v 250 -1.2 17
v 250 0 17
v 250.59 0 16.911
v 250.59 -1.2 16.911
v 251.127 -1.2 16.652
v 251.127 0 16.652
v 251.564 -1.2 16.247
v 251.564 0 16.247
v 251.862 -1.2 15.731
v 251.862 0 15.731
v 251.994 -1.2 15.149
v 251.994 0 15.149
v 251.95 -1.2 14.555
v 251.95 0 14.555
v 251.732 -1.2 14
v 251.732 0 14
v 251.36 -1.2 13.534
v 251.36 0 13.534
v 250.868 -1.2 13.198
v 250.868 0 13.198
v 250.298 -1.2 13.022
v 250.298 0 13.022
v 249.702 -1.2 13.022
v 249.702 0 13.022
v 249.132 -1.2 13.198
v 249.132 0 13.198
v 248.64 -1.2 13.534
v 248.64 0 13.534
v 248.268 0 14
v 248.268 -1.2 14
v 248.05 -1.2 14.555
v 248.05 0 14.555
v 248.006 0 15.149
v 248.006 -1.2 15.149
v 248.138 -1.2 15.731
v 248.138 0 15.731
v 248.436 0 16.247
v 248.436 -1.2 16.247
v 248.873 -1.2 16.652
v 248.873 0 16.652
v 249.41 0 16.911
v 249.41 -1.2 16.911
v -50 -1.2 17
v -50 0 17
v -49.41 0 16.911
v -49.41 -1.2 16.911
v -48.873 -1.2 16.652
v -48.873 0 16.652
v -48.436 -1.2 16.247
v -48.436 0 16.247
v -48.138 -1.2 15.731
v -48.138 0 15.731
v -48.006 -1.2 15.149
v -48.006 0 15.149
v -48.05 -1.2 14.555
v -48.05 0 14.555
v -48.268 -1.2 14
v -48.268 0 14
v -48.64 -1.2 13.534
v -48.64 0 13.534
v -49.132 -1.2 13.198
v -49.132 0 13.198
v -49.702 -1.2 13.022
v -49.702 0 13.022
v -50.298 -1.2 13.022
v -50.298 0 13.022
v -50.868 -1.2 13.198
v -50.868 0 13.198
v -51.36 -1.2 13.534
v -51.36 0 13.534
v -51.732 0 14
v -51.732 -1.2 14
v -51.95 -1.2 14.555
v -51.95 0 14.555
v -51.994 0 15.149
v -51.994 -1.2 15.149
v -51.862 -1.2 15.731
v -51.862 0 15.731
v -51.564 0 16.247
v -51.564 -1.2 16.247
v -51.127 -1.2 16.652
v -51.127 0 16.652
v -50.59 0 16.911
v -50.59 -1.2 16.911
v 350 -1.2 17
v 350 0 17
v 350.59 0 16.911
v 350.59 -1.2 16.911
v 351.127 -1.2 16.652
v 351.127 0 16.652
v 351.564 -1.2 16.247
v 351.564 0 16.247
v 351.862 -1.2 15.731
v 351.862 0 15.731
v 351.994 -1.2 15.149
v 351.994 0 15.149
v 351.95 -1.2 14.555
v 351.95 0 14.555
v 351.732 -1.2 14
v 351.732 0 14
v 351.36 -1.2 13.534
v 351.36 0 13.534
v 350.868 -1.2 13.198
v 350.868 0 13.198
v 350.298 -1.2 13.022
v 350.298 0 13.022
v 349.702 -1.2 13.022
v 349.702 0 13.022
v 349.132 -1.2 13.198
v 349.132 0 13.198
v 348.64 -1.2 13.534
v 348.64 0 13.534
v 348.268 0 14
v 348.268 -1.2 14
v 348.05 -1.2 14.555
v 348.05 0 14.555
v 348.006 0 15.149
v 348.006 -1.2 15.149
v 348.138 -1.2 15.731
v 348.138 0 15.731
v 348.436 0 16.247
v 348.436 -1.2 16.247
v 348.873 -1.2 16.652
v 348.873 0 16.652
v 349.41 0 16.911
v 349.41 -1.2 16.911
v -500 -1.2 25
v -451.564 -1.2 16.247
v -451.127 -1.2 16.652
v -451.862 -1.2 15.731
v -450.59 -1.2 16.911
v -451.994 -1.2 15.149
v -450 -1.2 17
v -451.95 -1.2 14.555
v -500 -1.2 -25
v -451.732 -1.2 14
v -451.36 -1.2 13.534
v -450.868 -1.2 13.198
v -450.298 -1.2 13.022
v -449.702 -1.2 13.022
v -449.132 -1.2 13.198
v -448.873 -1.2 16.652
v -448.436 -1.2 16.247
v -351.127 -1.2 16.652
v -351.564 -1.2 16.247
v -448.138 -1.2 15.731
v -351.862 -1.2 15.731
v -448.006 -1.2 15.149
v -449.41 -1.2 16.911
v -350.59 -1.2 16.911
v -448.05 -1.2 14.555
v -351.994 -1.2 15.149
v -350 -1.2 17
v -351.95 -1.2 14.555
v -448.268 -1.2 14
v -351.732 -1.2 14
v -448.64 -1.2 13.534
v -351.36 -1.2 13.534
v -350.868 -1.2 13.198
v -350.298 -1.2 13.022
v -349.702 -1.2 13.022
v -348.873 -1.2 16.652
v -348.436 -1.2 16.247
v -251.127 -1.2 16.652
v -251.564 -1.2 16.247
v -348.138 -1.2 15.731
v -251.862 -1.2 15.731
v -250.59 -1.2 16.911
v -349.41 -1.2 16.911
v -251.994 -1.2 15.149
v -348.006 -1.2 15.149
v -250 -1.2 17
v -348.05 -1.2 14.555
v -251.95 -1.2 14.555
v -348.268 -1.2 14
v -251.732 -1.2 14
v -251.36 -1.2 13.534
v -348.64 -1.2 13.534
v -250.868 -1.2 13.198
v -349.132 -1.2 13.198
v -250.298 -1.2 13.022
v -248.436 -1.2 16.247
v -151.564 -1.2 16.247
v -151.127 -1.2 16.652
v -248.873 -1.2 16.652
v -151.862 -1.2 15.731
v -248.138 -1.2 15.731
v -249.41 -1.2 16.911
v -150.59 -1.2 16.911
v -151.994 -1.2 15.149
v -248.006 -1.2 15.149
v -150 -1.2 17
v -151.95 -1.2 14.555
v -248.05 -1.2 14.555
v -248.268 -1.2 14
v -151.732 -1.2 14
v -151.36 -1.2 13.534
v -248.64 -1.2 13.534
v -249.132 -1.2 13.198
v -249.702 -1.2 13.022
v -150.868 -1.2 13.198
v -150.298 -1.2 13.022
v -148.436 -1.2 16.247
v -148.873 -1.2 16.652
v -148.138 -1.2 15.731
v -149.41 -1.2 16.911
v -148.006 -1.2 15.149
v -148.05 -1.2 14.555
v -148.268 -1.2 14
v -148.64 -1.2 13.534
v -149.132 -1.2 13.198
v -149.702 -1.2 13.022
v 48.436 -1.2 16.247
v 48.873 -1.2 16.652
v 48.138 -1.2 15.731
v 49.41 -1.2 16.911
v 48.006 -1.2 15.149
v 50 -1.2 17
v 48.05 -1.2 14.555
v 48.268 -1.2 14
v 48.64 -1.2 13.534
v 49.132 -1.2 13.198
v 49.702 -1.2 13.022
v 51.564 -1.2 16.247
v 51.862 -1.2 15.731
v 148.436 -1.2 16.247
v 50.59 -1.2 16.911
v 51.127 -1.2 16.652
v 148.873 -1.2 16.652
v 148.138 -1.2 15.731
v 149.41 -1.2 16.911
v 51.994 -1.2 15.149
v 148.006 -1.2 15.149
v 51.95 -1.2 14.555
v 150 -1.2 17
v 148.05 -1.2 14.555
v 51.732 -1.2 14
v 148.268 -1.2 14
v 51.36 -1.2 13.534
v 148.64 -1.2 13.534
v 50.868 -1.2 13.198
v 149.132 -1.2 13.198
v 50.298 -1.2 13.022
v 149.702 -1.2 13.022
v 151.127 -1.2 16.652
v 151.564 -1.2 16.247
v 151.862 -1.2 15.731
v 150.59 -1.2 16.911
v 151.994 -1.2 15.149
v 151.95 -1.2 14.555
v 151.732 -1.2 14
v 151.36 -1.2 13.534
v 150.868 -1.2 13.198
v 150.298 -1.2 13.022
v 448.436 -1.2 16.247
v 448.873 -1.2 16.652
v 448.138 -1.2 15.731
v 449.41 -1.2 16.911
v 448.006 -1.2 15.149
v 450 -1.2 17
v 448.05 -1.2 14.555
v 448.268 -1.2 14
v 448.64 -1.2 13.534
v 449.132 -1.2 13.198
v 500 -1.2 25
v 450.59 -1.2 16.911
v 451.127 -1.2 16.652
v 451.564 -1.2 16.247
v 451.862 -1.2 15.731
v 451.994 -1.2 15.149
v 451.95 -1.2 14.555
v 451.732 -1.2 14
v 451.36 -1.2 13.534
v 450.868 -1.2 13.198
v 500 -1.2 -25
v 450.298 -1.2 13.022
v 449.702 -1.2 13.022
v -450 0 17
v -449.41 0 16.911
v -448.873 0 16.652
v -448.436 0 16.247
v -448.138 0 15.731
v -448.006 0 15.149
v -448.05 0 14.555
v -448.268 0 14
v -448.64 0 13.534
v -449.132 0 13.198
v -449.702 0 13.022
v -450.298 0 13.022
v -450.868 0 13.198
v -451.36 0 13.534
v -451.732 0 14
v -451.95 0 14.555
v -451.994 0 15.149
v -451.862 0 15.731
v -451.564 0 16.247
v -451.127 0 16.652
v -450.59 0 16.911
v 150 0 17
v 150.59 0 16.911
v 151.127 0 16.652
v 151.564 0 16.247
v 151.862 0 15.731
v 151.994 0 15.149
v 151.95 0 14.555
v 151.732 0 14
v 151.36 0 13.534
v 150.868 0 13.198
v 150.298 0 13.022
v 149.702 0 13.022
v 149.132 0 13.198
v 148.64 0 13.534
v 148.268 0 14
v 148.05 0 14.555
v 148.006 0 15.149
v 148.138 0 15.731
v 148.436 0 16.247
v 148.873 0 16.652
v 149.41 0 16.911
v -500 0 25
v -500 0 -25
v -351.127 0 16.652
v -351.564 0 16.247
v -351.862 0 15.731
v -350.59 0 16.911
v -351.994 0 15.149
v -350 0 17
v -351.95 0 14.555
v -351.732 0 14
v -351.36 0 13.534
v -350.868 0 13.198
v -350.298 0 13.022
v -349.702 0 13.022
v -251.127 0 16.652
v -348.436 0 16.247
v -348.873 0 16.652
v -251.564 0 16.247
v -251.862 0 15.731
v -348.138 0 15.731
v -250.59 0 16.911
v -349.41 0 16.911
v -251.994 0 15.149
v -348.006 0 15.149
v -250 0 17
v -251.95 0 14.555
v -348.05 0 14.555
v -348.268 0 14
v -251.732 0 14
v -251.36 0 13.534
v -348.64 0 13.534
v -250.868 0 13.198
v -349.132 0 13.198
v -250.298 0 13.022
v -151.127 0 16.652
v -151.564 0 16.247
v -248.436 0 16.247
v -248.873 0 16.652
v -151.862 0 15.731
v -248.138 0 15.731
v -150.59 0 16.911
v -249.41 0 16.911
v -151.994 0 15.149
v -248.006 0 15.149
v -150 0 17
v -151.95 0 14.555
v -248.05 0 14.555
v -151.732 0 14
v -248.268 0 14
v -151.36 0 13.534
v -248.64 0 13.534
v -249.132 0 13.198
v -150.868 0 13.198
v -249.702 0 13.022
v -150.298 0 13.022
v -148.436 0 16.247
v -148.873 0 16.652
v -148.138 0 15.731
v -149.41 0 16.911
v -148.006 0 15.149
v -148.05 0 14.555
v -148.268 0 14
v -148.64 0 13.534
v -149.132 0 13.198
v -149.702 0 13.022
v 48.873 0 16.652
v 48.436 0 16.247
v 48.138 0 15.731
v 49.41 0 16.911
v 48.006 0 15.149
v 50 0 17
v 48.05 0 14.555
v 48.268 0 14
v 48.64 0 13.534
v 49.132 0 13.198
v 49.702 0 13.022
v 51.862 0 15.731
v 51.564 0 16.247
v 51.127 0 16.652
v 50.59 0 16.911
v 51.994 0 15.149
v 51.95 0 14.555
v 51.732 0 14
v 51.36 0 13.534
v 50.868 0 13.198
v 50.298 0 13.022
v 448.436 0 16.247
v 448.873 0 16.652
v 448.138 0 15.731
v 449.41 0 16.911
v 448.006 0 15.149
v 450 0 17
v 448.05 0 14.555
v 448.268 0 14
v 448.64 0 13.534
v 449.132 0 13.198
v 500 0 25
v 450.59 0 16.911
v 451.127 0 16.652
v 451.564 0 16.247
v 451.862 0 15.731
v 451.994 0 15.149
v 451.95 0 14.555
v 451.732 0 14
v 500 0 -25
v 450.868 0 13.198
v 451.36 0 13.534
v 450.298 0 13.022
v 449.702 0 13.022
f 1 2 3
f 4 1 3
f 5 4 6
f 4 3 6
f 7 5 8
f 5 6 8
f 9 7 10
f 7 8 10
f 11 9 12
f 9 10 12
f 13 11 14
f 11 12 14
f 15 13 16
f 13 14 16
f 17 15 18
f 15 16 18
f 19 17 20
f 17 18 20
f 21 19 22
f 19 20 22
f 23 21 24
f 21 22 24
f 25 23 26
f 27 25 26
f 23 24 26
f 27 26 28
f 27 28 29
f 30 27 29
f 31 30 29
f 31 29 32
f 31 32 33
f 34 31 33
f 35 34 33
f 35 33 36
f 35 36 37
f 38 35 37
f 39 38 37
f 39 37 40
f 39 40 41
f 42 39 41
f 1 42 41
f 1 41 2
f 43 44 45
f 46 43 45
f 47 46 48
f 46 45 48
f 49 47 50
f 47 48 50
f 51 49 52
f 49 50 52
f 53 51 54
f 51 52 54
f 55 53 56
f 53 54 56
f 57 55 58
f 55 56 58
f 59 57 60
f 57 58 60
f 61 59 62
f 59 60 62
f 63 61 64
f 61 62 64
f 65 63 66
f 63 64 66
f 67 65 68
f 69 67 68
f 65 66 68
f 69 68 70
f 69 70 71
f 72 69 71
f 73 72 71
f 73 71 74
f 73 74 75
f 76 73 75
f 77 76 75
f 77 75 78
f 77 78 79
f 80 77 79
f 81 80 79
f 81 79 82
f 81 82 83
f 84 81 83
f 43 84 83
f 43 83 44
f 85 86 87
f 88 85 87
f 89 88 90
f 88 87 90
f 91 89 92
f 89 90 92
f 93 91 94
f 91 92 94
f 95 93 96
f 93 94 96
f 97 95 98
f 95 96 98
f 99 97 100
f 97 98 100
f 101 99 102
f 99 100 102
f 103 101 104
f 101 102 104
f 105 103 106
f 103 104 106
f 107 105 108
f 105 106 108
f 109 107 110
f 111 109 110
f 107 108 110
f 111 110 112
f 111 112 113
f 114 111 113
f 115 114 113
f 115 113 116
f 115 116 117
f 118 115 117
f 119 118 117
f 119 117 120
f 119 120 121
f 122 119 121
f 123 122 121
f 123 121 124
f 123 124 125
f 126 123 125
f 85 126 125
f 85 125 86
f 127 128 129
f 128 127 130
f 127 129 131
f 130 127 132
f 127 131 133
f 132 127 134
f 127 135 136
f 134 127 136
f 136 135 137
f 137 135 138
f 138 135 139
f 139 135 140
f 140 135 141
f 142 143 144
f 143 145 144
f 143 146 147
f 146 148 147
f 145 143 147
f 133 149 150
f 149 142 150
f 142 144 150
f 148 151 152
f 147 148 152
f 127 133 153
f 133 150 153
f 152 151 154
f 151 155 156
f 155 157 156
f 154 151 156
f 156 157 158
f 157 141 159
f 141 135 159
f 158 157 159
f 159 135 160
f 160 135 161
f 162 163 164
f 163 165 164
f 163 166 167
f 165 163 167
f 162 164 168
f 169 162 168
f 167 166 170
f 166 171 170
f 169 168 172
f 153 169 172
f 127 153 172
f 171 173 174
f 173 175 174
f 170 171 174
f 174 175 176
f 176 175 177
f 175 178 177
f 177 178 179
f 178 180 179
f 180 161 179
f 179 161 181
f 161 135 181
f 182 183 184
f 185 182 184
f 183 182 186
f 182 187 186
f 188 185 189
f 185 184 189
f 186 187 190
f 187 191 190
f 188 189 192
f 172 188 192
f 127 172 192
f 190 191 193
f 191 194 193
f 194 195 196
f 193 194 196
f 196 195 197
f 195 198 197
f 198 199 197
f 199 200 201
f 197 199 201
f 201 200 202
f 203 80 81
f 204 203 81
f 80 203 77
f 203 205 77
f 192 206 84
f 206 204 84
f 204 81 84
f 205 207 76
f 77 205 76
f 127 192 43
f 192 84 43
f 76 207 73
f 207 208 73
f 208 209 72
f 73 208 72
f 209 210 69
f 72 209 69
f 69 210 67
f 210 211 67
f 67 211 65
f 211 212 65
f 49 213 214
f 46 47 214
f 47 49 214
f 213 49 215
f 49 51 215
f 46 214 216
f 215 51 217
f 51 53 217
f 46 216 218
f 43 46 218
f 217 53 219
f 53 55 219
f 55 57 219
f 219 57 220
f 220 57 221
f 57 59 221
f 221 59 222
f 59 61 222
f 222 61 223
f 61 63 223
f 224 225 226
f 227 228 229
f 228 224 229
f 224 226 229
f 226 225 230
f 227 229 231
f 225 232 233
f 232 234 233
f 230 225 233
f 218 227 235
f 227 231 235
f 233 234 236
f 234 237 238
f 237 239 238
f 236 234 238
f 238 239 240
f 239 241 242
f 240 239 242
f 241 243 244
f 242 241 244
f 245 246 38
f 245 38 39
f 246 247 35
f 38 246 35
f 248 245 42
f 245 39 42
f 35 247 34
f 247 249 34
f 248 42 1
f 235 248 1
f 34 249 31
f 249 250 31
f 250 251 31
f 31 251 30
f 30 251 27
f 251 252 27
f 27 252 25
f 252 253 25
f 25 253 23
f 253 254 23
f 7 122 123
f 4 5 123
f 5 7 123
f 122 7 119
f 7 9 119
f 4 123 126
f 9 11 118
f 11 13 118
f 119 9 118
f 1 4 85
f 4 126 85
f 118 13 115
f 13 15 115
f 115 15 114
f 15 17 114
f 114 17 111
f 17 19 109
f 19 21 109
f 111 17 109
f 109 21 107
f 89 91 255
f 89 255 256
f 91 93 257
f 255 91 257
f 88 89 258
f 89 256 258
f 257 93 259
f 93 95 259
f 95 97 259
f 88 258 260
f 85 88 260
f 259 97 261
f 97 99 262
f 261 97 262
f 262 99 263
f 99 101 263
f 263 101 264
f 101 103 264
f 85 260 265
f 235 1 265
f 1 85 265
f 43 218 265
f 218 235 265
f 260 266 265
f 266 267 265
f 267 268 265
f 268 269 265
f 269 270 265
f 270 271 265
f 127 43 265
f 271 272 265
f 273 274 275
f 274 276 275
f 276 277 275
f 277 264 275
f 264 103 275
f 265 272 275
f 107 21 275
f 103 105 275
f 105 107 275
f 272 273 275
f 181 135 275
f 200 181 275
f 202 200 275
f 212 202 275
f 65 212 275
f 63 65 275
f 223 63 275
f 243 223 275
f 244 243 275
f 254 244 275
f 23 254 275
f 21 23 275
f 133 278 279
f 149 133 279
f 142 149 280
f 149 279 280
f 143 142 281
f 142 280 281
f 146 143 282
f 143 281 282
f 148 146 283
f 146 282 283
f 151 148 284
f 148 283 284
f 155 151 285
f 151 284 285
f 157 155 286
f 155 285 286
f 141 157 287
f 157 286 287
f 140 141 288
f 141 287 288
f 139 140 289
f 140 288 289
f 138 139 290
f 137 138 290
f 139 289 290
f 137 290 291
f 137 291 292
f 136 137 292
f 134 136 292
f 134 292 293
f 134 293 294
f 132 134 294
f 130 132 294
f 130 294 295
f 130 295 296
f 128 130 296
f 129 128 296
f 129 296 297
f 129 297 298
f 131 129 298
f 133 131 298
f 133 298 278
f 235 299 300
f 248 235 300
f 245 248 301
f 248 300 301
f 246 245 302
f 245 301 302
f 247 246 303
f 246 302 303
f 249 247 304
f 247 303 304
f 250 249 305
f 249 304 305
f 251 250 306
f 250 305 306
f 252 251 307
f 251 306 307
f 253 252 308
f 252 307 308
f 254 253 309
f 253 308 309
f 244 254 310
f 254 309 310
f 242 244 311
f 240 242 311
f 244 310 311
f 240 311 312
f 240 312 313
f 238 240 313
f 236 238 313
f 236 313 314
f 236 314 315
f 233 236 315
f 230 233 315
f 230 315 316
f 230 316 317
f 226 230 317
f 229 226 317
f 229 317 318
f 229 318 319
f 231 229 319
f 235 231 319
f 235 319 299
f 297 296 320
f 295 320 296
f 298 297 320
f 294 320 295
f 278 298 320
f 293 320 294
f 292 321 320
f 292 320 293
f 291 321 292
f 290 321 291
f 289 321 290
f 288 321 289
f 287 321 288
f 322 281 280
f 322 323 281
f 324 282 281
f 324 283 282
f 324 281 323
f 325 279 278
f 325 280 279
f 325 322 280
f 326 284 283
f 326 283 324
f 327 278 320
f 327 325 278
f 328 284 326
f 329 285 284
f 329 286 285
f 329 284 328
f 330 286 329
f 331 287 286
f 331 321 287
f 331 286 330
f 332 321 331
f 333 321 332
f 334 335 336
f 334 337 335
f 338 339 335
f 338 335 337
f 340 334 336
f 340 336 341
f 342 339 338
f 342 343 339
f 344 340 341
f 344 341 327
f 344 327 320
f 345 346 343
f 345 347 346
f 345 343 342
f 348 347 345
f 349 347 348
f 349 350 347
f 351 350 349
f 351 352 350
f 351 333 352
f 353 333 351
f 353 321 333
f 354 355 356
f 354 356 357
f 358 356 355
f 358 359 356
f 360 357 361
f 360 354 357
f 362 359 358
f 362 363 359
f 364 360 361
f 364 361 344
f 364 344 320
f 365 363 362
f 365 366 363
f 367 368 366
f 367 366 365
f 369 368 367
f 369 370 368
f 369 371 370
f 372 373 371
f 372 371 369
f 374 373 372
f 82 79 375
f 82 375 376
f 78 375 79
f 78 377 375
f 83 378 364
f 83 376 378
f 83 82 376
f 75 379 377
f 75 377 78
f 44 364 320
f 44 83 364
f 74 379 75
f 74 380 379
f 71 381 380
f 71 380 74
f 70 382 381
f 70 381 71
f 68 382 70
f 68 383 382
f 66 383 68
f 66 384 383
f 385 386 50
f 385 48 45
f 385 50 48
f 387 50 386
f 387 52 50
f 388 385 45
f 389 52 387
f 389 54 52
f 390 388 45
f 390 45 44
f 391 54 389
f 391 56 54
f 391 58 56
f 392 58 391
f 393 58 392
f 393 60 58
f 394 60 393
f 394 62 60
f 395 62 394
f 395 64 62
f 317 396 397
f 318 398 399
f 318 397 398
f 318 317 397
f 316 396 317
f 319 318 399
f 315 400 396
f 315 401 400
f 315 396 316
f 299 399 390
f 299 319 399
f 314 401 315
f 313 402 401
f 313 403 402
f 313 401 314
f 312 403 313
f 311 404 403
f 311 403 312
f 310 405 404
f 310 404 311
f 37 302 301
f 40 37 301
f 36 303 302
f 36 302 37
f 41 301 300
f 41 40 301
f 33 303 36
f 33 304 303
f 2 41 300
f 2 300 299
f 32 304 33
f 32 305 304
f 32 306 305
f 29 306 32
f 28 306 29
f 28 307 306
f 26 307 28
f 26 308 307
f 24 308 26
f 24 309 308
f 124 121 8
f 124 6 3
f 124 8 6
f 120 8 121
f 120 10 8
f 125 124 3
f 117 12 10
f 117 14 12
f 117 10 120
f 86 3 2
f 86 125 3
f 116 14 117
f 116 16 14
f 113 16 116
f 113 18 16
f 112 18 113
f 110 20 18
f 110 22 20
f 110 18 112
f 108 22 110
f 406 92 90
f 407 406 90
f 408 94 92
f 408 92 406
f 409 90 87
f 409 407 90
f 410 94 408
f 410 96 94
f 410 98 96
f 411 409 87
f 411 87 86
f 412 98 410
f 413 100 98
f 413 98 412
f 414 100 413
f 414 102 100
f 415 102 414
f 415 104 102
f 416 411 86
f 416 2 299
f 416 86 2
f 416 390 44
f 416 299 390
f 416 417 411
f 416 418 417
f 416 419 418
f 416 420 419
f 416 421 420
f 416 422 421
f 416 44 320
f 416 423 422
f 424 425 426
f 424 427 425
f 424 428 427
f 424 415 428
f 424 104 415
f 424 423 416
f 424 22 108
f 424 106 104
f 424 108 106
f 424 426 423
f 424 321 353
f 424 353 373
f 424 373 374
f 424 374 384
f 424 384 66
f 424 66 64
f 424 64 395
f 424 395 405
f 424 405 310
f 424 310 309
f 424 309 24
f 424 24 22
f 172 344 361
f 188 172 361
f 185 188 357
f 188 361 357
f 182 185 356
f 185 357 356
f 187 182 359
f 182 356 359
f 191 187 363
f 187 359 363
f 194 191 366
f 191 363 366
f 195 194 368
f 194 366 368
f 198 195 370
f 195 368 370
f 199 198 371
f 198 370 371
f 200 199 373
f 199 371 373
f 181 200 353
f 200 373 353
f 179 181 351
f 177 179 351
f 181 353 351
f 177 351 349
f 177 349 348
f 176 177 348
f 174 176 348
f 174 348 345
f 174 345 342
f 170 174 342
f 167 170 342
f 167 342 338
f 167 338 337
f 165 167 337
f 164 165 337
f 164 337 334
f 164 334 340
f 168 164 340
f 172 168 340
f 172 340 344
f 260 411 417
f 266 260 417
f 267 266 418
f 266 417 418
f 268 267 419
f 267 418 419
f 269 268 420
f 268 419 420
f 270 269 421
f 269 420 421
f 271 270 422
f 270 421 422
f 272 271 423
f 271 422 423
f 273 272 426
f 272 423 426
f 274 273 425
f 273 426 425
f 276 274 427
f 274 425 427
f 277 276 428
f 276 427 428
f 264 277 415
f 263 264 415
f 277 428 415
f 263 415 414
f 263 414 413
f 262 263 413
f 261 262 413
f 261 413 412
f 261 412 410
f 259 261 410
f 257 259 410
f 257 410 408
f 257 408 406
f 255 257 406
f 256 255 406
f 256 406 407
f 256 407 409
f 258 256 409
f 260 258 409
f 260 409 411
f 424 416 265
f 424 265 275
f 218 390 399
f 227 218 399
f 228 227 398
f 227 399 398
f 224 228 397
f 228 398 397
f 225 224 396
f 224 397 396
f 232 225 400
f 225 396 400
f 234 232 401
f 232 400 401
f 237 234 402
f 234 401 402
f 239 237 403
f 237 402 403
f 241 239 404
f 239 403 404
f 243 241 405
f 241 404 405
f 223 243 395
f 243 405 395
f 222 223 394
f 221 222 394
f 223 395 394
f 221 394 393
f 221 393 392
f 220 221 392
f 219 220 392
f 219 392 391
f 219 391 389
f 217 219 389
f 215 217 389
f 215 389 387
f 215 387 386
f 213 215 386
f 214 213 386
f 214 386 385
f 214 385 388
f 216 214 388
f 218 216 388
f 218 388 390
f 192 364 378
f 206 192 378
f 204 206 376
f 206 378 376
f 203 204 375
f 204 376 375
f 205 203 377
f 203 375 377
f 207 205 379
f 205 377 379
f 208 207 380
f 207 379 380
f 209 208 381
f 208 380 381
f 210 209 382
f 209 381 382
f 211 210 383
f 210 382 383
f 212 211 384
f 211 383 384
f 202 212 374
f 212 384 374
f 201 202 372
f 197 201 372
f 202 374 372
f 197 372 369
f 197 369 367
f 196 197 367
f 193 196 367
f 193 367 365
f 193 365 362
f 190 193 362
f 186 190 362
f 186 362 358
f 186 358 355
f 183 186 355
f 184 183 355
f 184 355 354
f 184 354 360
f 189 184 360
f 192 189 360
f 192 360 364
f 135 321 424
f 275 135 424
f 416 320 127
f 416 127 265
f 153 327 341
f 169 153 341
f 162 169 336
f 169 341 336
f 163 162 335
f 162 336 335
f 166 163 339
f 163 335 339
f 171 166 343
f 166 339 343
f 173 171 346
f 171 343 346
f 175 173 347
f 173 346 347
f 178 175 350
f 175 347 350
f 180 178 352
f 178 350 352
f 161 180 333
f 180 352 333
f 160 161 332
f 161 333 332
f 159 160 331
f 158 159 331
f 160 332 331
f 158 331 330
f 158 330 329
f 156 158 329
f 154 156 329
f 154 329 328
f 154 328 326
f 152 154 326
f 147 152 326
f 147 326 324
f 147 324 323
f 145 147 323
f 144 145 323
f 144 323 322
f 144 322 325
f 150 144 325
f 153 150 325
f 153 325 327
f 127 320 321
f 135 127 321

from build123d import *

# Parameters (mm, degrees)
SKETCH1_W          = 1000
SKETCH1_H          = 50
BASE_FLANGE1_DEPTH = 1.2
SKETCH2_R          = 2
CUT_EXTRUDE1_DEPTH = 10


# Sheet-metal steps are written as plain solids
with BuildPart() as part:
    # Sketch1 → Base-Flange1 (new body)
    with BuildSketch(Plane(origin=(0, 0, 0), x_dir=(1, 0, 0), z_dir=(0, 1, 0))):
        Rectangle(SKETCH1_W, SKETCH1_H)
    extrude(amount=-BASE_FLANGE1_DEPTH)

    # Sketch2 → Cut-Extrude1 (cut)
    with BuildSketch(Plane(origin=(0, 0, 0), x_dir=(1, 0, 0), z_dir=(0, 1, 0))):
        with Locations(Location((-450, -15, 0), (0, 0, 270))):
            Circle(SKETCH2_R)
        with Locations(Location((-350, -15, 0), (0, 0, 270))):
            Circle(SKETCH2_R)
        with Locations(Location((-250, -15, 0), (0, 0, 270))):
            Circle(SKETCH2_R)
        with Locations(Location((-150, -15, 0), (0, 0, 270))):
            Circle(SKETCH2_R)
        with Locations(Location((-50, -15, 0), (0, 0, 270))):
            Circle(SKETCH2_R)
        with Locations(Location((50, -15, 0), (0, 0, 270))):
            Circle(SKETCH2_R)
        with Locations(Location((150, -15, 0), (0, 0, 270))):
            Circle(SKETCH2_R)
        with Locations(Location((250, -15, 0), (0, 0, 270))):
            Circle(SKETCH2_R)
        with Locations(Location((350, -15, 0), (0, 0, 270))):
            Circle(SKETCH2_R)
        with Locations(Location((450, -15, 0), (0, 0, 270))):
            Circle(SKETCH2_R)
    extrude(amount=-CUT_EXTRUDE1_DEPTH, mode=Mode.SUBTRACT)


solid = part.part
